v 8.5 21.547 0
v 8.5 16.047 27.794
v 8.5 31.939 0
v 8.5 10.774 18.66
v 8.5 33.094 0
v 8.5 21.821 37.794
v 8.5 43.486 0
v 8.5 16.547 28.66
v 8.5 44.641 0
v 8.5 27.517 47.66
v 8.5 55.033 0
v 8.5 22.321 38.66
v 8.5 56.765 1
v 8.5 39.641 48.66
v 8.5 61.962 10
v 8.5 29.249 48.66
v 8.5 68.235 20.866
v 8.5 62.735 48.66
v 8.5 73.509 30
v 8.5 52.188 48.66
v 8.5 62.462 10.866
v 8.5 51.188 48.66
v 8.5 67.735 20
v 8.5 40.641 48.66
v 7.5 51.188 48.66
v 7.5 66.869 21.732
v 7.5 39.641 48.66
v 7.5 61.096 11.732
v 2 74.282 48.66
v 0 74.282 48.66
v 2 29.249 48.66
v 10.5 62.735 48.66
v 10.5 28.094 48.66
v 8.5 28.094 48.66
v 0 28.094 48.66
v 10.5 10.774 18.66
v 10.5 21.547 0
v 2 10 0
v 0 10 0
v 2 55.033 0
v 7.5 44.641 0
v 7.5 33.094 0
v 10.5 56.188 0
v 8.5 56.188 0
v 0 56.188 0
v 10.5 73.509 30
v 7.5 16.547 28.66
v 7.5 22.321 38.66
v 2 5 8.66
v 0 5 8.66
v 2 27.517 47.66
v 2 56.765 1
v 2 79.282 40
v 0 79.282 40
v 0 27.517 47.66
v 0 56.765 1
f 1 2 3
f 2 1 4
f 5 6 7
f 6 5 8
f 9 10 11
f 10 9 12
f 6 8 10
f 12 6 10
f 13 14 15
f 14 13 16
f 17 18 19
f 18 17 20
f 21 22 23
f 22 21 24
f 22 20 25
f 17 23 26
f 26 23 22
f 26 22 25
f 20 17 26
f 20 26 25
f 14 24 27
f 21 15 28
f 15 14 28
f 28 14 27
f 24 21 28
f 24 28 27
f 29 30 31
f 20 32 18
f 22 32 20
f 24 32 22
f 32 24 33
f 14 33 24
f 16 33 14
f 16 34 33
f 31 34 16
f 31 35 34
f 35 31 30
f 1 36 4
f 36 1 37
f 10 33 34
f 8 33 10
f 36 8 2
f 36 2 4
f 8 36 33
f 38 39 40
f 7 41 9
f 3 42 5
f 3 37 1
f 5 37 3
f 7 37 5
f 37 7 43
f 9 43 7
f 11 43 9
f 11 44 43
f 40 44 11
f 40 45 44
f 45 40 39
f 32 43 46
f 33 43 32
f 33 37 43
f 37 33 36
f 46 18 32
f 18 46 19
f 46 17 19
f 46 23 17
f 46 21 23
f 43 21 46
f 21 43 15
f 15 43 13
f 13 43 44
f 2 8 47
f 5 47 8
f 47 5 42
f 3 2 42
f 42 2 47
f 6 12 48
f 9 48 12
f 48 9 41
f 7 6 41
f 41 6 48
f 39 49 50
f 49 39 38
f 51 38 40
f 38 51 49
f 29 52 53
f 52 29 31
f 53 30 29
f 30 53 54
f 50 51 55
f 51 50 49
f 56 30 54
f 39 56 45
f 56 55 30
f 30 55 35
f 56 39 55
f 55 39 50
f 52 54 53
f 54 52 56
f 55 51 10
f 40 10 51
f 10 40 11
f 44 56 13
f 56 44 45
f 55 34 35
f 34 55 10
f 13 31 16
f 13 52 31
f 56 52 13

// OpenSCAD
paperthick=6.5;
clipsize=80;
clipshortside=10;
clipthick=2;

module shield (shortSideLength, longSideLength, shieldThick) {
    /*
        z
        ^
        |       4________3
        |       /        \
        |      /         /2
        |     /         /
        |  5 /         /
        |    \________/
        |     0      1
       -+-----------------> y
        |

                __
        length( 05 ) : shortSideLength.
             __  __
        dist(05, 23) : longSideLength.
	
    */
    polyhedron(
        points = [ [0,shortSideLength,0], 
                   [0,(longSideLength/2+shortSideLength*sqrt(3)/2)*2.0/sqrt(3),0], 
                   [0,(longSideLength/2+shortSideLength*sqrt(3)/2)*2.0/sqrt(3)+((longSideLength/2+shortSideLength*sqrt(3)/2)*2/sqrt(3)-shortSideLength)/2,((longSideLength/2+shortSideLength*sqrt(3)/2)*2/sqrt(3)-shortSideLength)*sqrt(3)/2],
                   [0,(longSideLength/2+shortSideLength*sqrt(3)/2)*2.0/sqrt(3)+((longSideLength/2+shortSideLength*sqrt(3)/2)*2/sqrt(3)-shortSideLength)/2-shortSideLength/2,(longSideLength/2+shortSideLength*sqrt(3)/2)], 
                   [0,(longSideLength/2+shortSideLength*sqrt(3)/2)/sqrt(3), (longSideLength/2+shortSideLength*sqrt(3)/2)], 
                   [0,shortSideLength/2,shortSideLength*sqrt(3)/2],
               
                   [shieldThick,shortSideLength,0], 
                   [shieldThick,(longSideLength/2+shortSideLength*sqrt(3)/2)*2.0/sqrt(3),0], 
                   [shieldThick,(longSideLength/2+shortSideLength*sqrt(3)/2)*2.0/sqrt(3)+((longSideLength/2+shortSideLength*sqrt(3)/2)*2/sqrt(3)-shortSideLength)/2,((longSideLength/2+shortSideLength*sqrt(3)/2)*2/sqrt(3)-shortSideLength)*sqrt(3)/2],
                   [shieldThick,(longSideLength/2+shortSideLength*sqrt(3)/2)*2.0/sqrt(3)+((longSideLength/2+shortSideLength*sqrt(3)/2)*2/sqrt(3)-shortSideLength)/2-shortSideLength/2,(longSideLength/2+shortSideLength*sqrt(3)/2)], 
                   [shieldThick,(longSideLength/2+shortSideLength*sqrt(3)/2)/sqrt(3), (longSideLength/2+shortSideLength*sqrt(3)/2)], 
                   [shieldThick,shortSideLength/2,shortSideLength*sqrt(3)/2],
        ],
        faces = [ [0,1,2], [0,2,3], [0,3,4], [0,4,5],
                  [6,8,7], [6,9,8], [6,10,9], [6,11,10],
                  [0,7, 1], [0,6, 7],
                  [1,8, 2], [1,7, 8],
                  [2,9, 3], [2,8, 9],
                  [3,10,4], [3,9, 10],
                  [4,11,5], [4,10,11],
                  [5,6, 0], [5,11,6]
        ]
    );
}

module bumper1 (length) {
    polyhedron(
        points = [ [0,length,0], 
                [0,length/2,length*sqrt(3)/2],
                [0,length-1/sqrt(3)*2,0], 
                [0,length/2-1/2,length*sqrt(3)/2-1*sqrt(3)/2],
                [-1,length,0], 
                [-1,length/2,length*sqrt(3)/2],
        ],
        faces = [ [0,3,1], [0,2,3],
                 [5,1,3],
                 [0,4,2],
                 [4,0,1], [4,1,5],
                 [2,4,3], [4,5,3]
        ]
    );
}

module bumper2(length) {

    polyhedron(
        points = [ [0,-length/2,-length*sqrt(3)/2],
                [0,-length,0], 
                [0,-length/2+1/2,-length*sqrt(3)/2+1*sqrt(3)/2],
                [0,-length+1,0],
                [-1,-length/2-sqrt(3)/2,-length*sqrt(3)/2+sqrt(3)],
                [-1,-length,0]
        ],
        faces = [ [0,1,3], [0,3,2],
                 [1,5,3],
                 [4,0,2],
                 [4,1,0], [4,5,1],
                 [2,3,4], [4,3,5]
        ]
    );
}

bShortSide = 0.75 * clipshortside + 0.25 * (clipsize/2+clipshortside*sqrt(3)/2)/sqrt(3)*2;
bTooth1Side = 0.5 * clipshortside + 0.5 * (clipsize/2+clipshortside*sqrt(3)/2)/sqrt(3)*2;
bTooth2Side = 0.25 * clipshortside + 0.75 * (clipsize/2+clipshortside*sqrt(3)/2)/sqrt(3)*2;

union() {

    shield(clipshortside, clipsize, clipthick);

    shield((clipshortside/2*sqrt(3)+clipsize/2)/sqrt(3)*2-clipthick/sqrt(3),clipthick,paperthick+clipthick);
    
    translate ([clipthick + paperthick,0,0]) {
        shield(bShortSide, clipsize+clipshortside*sqrt(3)-bShortSide*sqrt(3), clipthick);
        bumper1(bTooth1Side);
        bumper1(bTooth2Side);
        translate([0,(clipsize/2+clipshortside*sqrt(3)/2)*2.0/sqrt(3)+((clipsize/2+clipshortside*sqrt(3)/2)*2/sqrt(3))/2,((clipsize/2+clipshortside*sqrt(3)/2))]) {
            bumper2(bTooth1Side);
            bumper2(bTooth2Side);
        }
    }
}
